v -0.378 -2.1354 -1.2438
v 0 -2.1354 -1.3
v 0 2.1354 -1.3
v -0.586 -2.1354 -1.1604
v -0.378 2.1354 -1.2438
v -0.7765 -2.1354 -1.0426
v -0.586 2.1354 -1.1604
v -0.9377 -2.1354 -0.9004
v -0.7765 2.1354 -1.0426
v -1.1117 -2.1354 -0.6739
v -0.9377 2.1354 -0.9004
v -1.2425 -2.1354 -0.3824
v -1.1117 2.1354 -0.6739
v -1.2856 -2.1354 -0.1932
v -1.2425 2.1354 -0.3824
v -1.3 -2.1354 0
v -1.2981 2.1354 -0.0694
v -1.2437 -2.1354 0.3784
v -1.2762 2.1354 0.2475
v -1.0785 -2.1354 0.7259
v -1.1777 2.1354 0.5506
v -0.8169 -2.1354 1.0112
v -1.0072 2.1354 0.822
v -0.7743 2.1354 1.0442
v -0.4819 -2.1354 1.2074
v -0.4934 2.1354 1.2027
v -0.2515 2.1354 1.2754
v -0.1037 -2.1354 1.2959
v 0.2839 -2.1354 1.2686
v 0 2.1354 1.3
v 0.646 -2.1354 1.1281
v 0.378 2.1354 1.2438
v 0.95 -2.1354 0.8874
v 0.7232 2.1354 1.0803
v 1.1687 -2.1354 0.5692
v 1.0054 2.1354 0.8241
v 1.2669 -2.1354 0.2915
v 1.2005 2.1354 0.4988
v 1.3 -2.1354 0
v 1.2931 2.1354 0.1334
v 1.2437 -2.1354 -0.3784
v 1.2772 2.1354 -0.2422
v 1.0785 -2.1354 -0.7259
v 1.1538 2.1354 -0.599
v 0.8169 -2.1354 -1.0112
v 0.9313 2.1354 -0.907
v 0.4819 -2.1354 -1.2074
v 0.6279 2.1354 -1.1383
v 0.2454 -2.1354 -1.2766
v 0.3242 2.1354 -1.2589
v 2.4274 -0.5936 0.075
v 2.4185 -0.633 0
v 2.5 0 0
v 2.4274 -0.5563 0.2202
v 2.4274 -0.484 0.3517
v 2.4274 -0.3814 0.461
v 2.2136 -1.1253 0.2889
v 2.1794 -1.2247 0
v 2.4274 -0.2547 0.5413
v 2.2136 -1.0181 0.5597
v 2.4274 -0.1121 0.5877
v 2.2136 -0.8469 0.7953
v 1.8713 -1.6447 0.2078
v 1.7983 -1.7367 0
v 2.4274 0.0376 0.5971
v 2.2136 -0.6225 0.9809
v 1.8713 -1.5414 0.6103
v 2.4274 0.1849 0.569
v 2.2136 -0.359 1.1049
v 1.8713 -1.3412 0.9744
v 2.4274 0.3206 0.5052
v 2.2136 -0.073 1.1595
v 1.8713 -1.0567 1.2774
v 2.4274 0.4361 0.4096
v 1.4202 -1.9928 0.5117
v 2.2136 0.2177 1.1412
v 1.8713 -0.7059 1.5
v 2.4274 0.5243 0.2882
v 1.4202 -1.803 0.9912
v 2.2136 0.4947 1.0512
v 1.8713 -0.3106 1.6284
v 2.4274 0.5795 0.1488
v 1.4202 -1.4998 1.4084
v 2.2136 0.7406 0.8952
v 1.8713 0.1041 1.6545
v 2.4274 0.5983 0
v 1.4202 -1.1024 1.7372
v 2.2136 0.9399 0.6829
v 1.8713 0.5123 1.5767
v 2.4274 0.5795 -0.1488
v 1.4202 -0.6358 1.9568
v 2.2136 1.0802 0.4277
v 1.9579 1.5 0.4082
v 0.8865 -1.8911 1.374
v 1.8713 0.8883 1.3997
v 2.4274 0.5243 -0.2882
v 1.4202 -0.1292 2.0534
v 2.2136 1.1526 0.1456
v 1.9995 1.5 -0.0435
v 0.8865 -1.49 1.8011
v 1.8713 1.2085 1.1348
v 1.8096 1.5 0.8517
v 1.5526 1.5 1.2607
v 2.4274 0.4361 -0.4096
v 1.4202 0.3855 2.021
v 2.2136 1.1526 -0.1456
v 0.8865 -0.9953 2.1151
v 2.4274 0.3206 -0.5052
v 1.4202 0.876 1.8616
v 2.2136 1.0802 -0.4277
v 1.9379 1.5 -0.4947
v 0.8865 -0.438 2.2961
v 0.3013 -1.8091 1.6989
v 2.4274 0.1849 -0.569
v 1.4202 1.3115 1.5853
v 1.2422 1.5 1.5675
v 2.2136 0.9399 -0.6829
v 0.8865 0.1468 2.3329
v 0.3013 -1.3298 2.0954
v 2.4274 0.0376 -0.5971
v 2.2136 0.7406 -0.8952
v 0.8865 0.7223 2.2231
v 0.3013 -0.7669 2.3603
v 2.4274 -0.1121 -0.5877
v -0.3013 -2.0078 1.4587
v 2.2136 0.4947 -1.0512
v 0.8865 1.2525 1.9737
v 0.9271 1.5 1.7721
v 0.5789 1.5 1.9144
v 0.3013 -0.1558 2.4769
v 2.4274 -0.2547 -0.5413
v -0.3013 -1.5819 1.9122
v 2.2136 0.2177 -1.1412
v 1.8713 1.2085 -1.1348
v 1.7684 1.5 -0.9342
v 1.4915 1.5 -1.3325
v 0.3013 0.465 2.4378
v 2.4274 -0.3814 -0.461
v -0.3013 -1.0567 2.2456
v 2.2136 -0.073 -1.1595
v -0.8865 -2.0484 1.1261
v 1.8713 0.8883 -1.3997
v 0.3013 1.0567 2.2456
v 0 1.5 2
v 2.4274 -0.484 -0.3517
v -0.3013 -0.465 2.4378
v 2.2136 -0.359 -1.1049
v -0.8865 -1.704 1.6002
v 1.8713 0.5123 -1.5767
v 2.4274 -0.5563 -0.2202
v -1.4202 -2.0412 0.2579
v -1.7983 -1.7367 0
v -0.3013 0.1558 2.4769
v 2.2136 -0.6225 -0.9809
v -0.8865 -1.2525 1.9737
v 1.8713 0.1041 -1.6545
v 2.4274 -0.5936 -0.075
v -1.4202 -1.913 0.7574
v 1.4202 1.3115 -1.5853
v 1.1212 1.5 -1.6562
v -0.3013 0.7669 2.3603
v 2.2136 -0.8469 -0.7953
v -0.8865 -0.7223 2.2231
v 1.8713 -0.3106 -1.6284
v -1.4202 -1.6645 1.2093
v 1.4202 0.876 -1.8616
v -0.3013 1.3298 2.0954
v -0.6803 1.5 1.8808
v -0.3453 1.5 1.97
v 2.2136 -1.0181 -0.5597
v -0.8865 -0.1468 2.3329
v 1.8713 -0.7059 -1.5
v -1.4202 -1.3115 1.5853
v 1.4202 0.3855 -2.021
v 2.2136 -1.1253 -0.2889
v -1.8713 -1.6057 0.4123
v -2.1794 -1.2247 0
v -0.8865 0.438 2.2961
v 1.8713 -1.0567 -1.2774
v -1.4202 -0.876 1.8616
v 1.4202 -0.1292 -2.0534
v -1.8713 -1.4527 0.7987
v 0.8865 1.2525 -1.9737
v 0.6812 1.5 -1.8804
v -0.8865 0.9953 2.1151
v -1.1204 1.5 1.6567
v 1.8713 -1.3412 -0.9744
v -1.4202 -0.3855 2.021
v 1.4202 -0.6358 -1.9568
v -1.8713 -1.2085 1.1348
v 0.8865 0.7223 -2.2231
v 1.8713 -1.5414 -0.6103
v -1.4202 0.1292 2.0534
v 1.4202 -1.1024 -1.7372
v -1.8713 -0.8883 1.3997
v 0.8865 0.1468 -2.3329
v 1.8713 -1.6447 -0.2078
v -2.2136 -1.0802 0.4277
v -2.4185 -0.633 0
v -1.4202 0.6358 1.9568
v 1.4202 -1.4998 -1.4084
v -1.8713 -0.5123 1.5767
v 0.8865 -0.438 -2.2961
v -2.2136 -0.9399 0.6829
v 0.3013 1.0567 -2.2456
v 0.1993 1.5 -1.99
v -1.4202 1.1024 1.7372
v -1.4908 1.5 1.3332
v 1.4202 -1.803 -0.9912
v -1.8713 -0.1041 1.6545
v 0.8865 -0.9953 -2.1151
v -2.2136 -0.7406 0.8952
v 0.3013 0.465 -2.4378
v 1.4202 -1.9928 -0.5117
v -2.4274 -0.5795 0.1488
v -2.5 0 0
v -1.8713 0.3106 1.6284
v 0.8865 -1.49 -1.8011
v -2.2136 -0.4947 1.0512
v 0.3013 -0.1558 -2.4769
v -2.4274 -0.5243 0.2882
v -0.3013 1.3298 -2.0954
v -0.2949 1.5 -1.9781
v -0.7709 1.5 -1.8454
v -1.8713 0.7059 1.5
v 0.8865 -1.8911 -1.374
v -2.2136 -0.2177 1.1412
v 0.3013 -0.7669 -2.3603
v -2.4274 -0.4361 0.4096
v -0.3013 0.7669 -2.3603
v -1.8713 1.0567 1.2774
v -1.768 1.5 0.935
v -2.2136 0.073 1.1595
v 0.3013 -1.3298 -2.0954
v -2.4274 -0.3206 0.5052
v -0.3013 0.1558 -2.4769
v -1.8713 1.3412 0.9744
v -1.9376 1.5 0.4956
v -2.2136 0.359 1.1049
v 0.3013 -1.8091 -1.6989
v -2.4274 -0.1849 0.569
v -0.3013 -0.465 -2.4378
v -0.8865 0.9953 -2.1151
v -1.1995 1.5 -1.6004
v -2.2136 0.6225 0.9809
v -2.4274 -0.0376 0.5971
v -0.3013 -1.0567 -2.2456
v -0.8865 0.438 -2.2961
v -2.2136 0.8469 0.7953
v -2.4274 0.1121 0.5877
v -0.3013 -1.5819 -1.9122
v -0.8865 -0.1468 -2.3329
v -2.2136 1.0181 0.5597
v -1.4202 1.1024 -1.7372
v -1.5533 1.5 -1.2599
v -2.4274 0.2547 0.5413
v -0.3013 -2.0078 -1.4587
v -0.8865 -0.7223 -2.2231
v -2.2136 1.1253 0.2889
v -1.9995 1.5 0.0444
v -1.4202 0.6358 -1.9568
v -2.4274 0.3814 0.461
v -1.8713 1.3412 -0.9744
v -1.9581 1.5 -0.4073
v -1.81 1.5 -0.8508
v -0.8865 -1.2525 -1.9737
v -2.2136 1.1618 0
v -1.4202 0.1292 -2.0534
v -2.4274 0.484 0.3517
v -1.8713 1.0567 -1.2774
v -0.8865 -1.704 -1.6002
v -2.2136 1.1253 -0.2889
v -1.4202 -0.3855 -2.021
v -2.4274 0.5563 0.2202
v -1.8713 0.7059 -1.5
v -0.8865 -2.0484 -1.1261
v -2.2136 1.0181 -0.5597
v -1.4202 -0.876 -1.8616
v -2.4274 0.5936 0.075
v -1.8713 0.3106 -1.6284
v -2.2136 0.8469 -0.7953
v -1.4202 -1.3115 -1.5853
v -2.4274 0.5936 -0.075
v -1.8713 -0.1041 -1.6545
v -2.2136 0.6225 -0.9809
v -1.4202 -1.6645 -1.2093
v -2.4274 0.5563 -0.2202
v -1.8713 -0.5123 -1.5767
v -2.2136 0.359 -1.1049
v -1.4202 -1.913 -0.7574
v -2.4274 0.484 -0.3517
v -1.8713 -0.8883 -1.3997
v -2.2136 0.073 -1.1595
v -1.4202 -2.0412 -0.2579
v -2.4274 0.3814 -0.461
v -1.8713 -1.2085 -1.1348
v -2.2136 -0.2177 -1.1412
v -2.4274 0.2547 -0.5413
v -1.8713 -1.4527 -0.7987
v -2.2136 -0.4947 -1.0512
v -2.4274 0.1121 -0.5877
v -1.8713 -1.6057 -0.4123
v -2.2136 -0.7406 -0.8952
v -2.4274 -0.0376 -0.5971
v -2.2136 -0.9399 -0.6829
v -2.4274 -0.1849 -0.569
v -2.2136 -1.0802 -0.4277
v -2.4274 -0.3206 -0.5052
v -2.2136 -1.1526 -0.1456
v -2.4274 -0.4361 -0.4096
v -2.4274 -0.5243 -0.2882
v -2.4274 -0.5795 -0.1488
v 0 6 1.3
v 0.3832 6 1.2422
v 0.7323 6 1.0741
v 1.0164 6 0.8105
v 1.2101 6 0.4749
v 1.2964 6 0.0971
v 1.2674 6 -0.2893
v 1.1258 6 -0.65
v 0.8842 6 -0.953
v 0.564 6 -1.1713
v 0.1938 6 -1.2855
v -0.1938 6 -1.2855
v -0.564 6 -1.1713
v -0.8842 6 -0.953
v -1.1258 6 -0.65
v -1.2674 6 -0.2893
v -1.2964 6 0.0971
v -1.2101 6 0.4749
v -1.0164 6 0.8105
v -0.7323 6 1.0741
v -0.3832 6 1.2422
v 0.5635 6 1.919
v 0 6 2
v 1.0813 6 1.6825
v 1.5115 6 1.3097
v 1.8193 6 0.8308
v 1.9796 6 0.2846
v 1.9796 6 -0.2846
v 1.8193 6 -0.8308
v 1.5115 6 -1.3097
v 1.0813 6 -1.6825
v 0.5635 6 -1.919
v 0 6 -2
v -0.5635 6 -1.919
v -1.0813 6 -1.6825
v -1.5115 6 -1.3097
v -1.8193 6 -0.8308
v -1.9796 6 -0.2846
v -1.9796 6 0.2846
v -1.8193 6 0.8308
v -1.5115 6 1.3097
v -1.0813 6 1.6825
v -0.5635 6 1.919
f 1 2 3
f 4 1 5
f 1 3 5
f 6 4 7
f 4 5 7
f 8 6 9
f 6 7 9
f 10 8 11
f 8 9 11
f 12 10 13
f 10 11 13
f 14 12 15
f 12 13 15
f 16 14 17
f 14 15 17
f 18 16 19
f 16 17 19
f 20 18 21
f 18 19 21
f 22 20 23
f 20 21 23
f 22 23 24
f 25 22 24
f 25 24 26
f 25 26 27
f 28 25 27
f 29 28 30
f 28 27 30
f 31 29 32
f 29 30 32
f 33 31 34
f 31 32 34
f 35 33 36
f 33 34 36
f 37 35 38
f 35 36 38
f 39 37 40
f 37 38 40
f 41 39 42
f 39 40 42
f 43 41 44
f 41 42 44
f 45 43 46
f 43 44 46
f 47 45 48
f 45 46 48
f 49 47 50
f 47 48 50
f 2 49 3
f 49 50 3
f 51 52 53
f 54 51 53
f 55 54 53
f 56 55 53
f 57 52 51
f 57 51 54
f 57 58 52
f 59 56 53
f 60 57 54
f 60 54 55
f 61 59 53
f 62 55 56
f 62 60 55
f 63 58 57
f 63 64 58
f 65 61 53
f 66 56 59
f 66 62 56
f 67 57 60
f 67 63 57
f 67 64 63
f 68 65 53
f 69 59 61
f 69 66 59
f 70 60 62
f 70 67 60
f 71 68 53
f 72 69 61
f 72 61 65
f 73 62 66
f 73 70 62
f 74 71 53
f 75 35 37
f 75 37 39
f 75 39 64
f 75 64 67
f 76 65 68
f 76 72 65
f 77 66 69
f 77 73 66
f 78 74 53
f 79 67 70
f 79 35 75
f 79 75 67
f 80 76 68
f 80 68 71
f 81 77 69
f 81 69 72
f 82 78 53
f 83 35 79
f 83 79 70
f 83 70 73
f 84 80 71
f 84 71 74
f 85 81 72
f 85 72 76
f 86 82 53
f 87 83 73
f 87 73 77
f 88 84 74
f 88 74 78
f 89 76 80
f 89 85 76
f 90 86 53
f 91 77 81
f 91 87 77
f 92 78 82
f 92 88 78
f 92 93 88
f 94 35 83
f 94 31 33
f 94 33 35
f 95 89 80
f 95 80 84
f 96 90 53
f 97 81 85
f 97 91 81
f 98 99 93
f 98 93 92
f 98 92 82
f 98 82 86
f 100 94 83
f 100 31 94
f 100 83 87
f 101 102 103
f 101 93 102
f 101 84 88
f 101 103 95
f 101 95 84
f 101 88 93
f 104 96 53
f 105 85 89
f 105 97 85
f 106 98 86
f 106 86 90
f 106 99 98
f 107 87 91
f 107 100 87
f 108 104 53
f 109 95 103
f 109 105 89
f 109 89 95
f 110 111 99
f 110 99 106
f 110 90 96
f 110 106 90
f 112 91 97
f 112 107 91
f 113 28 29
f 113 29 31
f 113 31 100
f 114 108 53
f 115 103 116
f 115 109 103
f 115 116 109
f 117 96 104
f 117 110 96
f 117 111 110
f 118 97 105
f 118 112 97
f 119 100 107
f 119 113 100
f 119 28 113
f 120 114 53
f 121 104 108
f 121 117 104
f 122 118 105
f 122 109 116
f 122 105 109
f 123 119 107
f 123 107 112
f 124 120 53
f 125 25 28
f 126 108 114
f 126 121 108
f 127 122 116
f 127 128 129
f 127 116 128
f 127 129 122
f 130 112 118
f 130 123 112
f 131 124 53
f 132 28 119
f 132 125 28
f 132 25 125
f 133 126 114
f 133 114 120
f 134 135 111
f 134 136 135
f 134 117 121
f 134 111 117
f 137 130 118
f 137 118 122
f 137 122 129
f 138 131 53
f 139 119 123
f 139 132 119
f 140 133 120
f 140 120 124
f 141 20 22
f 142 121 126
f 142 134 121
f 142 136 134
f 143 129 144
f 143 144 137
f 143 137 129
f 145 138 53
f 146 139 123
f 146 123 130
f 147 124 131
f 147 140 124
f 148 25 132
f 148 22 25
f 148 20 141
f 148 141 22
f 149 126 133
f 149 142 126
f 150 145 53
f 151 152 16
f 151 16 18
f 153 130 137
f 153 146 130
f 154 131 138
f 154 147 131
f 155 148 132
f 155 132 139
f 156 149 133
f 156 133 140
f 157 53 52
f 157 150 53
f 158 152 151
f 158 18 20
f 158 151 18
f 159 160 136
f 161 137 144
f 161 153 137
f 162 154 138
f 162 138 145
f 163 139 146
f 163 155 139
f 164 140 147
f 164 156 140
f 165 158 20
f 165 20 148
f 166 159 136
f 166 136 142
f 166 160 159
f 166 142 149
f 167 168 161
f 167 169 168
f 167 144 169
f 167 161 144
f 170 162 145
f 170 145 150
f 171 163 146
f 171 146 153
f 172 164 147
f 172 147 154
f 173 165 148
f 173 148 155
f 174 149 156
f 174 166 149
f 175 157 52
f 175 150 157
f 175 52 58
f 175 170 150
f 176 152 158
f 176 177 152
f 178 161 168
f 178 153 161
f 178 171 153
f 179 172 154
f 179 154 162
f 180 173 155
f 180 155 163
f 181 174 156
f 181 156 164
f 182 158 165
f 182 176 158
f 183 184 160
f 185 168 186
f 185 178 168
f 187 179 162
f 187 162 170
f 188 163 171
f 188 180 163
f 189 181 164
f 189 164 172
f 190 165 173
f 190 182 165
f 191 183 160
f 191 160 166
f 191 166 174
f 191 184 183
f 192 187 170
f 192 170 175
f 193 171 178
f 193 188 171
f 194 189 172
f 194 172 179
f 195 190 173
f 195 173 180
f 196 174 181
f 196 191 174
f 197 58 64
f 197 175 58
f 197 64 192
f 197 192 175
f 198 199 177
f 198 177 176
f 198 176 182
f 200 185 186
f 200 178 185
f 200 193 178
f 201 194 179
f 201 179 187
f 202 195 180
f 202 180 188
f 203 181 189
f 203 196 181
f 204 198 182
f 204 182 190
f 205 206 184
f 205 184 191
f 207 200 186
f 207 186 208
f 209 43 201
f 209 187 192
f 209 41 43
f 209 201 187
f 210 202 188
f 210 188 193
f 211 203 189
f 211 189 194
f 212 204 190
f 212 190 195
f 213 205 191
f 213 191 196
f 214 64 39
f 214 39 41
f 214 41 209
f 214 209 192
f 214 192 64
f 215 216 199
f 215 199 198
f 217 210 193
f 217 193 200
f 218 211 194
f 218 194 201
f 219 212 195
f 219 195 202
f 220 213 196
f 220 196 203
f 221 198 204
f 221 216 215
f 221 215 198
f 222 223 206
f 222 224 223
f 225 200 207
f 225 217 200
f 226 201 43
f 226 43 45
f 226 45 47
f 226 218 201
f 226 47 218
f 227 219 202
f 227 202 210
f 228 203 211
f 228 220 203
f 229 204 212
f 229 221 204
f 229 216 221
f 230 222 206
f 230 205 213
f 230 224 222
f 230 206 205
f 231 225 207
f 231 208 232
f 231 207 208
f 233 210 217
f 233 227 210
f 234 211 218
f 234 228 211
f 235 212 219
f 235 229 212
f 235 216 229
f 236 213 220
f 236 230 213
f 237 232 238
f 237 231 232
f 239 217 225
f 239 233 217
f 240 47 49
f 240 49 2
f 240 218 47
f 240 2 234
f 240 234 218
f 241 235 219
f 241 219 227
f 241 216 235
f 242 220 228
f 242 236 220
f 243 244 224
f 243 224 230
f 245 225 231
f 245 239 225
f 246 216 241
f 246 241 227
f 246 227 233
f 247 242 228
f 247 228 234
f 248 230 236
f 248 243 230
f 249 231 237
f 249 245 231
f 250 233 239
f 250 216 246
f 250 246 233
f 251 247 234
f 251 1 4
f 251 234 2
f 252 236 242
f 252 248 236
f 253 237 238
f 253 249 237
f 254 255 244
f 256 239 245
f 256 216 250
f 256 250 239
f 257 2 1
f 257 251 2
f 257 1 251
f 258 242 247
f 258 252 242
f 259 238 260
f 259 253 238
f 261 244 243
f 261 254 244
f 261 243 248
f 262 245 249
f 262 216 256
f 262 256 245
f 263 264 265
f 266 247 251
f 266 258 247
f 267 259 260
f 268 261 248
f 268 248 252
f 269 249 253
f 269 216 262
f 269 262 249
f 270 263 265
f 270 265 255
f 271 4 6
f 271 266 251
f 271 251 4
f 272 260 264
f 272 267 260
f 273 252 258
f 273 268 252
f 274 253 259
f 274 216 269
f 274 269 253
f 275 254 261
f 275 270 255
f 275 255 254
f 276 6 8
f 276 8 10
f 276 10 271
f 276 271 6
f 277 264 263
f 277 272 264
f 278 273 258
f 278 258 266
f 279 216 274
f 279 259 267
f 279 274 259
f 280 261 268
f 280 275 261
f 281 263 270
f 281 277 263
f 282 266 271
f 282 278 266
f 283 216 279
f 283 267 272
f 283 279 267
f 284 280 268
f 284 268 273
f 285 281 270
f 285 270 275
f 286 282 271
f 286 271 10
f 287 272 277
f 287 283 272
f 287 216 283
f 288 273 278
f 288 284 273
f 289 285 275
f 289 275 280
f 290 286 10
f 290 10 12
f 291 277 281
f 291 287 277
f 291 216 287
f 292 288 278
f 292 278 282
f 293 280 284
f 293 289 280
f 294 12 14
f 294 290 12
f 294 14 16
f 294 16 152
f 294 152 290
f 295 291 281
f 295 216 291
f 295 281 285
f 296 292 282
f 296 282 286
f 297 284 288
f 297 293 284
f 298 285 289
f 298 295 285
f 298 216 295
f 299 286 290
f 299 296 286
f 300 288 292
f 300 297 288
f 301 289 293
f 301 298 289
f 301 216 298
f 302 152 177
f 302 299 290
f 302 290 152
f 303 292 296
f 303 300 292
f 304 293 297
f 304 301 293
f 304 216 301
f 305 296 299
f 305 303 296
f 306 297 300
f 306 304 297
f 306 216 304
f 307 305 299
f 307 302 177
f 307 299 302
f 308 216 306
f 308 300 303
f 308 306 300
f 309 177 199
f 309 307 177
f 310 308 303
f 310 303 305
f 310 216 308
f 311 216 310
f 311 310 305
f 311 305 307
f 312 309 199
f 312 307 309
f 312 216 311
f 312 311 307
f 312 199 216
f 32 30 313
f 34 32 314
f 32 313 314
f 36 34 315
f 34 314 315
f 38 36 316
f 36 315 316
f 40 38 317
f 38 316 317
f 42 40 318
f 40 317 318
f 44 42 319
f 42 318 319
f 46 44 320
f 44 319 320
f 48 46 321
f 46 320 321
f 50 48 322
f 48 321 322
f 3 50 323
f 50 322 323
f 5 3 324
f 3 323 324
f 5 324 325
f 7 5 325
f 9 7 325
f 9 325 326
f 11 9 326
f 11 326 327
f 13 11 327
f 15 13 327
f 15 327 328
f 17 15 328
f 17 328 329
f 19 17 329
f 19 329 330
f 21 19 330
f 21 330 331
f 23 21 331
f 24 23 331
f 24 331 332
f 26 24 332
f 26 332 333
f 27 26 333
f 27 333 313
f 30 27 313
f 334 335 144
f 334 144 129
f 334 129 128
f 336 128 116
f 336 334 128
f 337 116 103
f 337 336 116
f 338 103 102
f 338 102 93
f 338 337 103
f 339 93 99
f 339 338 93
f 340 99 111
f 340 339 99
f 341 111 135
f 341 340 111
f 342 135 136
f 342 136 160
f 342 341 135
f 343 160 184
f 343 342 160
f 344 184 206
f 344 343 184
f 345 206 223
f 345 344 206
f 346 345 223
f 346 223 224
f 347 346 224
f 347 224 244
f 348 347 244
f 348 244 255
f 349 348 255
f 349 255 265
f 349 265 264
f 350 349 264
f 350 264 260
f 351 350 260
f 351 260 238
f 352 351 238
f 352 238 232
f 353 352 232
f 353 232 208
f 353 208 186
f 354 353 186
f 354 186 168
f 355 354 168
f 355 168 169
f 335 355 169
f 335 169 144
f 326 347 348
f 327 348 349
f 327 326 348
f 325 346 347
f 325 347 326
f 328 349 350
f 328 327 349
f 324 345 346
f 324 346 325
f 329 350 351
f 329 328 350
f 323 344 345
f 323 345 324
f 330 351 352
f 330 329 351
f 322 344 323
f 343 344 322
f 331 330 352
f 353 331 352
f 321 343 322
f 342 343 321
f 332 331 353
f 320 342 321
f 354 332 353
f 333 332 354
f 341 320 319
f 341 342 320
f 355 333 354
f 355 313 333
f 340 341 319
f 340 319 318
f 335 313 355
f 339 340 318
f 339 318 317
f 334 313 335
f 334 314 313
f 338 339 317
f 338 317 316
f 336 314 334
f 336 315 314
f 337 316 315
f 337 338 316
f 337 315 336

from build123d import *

# Parameters (mm, degrees)
SKETCH2_R           = 1.3
CUT_EXTRUDE1_DEPTH  = 15
BOSS_EXTRUDE1_START = 6
SKETCH3_R           = 2
SKETCH3_R_2         = 1.3
BOSS_EXTRUDE1_DEPTH = 6


with BuildPart() as part:
    # Sketch1 → Revolve2 (revolve)
    with BuildSketch(Plane.XY):
        with BuildLine():
            Line((-2.5, 0), (2.5, 0))
            ThreePointArc((2.5, 0), (0, -2.5), (-2.5, 0))
        make_face()
    revolve(axis=Axis((4.664316952, 0, 0), (-1, 0, 0)))

    # Sketch2 → Cut-Extrude1 (cut, symmetric)
    with BuildSketch(Plane(origin=(0, 0, 0), x_dir=(1, 0, 0), z_dir=(0, 1, 0))):
        with Locations(Location((0, 0, 0), (0, 0, 90))):
            Circle(SKETCH2_R)
    extrude(amount=CUT_EXTRUDE1_DEPTH, both=True, mode=Mode.SUBTRACT)

    # Sketch3 → Boss-Extrude1 (add)
    with BuildSketch(Plane(origin=(0, 0, 0), x_dir=(1, 0, 0), z_dir=(0, 1, 0)).offset(BOSS_EXTRUDE1_START)):
        with Locations(Location((0, 0, 0), (0, 0, 270))):
            Circle(SKETCH3_R)
        with Locations(Location((0, 0, 0), (0, 0, 270))):
            Circle(SKETCH3_R_2, mode=Mode.SUBTRACT)
    extrude(amount=-BOSS_EXTRUDE1_DEPTH)


solid = part.part
